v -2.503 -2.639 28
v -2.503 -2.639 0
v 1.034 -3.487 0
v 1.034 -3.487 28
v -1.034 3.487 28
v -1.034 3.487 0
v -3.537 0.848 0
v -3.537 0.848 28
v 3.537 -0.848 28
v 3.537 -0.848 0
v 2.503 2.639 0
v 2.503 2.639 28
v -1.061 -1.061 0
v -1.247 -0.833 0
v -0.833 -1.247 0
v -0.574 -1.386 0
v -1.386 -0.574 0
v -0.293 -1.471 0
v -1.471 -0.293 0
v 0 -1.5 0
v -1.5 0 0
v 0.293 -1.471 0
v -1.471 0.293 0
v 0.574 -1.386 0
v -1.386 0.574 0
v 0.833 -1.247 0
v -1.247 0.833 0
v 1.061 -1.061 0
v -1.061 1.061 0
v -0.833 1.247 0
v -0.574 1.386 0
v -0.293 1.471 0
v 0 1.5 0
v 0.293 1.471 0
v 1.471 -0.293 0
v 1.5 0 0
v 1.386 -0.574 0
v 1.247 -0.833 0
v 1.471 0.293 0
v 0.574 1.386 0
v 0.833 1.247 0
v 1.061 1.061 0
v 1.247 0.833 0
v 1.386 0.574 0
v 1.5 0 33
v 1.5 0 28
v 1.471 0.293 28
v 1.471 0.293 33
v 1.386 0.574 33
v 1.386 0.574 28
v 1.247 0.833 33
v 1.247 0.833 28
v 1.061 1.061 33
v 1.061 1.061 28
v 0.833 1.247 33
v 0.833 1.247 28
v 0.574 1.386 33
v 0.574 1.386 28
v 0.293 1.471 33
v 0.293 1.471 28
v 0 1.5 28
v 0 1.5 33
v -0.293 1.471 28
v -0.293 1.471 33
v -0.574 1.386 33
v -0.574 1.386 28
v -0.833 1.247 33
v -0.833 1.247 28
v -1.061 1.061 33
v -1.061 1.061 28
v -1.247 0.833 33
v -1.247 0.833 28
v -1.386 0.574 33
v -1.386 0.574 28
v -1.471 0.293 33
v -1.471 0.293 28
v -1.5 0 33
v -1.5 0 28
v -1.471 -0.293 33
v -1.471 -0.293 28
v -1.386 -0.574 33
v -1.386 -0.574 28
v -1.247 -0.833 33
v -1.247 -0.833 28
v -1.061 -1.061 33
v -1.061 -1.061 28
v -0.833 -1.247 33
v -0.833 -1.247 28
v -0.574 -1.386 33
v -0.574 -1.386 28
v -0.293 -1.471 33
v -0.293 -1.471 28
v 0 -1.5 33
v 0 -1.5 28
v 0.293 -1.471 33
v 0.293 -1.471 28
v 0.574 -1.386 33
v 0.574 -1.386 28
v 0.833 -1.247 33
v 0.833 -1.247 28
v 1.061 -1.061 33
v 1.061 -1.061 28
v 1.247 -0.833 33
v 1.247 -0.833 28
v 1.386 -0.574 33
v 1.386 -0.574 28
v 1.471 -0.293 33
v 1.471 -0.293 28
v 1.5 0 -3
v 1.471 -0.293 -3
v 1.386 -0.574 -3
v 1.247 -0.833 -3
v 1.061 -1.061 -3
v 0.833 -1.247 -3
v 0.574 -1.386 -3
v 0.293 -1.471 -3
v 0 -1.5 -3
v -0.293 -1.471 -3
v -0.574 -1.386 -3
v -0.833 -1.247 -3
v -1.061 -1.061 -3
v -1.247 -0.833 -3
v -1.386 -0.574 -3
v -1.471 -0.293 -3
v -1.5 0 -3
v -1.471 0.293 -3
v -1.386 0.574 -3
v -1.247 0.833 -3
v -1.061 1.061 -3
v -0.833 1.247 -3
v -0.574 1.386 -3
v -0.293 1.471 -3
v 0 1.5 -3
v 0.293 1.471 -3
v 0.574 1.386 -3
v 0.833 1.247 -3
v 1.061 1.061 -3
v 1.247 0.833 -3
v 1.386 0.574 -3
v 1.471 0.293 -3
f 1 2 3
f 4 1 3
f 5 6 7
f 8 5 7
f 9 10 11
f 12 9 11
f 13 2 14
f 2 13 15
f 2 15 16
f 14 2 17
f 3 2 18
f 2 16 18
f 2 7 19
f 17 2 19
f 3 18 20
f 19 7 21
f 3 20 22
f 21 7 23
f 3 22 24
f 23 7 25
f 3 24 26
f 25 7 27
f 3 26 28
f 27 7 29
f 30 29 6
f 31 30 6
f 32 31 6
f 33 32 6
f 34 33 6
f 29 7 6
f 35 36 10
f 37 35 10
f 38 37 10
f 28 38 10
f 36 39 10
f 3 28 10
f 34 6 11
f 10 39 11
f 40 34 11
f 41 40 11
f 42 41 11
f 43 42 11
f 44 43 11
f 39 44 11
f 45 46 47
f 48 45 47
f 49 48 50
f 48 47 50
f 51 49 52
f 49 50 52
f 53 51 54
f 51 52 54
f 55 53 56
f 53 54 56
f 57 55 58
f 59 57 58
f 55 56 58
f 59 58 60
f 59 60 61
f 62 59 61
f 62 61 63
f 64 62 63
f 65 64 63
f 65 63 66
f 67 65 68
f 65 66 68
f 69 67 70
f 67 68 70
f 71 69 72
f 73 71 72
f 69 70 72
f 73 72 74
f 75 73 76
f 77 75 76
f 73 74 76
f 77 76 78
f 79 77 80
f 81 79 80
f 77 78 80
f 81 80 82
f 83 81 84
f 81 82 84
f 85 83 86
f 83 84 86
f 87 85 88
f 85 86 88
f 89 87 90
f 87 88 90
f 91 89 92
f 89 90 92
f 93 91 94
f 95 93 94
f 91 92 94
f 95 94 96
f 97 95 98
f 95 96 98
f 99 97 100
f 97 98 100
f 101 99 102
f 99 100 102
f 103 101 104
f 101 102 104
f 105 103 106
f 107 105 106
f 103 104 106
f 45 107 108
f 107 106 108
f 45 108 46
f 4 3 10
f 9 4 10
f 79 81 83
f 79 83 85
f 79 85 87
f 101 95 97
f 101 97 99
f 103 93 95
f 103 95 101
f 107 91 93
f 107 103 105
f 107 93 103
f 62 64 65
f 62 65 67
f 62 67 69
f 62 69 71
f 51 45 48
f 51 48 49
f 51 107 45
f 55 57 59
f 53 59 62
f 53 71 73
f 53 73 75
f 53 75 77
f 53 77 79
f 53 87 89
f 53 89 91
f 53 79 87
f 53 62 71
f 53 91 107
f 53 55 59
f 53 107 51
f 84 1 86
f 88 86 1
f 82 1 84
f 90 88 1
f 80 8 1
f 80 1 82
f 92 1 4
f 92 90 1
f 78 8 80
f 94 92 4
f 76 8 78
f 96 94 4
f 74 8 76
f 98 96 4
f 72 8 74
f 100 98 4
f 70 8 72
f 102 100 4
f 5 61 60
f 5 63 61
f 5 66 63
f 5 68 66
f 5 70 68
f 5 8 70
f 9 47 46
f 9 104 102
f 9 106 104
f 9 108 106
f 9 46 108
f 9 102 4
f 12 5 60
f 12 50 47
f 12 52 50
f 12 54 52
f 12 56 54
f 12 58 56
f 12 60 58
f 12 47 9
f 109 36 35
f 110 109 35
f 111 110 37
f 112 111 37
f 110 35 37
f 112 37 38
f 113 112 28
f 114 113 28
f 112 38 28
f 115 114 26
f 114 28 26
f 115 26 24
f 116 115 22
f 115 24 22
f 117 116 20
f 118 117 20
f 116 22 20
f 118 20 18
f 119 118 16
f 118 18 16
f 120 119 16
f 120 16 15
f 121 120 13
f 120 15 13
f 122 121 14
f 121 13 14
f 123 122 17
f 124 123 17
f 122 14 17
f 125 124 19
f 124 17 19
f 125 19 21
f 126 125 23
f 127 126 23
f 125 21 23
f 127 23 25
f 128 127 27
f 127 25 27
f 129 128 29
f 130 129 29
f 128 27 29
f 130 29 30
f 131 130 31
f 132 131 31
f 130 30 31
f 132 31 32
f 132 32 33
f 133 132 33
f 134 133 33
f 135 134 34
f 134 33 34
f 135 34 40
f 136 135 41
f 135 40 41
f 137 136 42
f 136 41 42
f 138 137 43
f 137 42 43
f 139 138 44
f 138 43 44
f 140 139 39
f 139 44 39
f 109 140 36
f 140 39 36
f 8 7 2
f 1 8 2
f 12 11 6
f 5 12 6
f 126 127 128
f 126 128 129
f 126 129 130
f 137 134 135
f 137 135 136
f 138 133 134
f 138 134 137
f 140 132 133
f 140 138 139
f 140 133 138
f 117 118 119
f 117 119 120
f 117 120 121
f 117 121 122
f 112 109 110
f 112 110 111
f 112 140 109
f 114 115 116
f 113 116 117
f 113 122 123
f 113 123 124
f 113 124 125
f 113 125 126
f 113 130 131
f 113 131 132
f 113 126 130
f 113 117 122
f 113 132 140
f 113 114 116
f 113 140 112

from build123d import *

# Parameters (mm, degrees)
F1_DEPTH = 28
F2_R     = 1.5
F3_DEPTH = 5
F4_R     = 1.5
F5_DEPTH = 3


with BuildPart() as f1:
    # F0 (on Top) → F1 (new body)
    with BuildSketch(Plane.XY):
        Polygon((3.5371081789, -0.8478594996), (2.5028219549, 2.639295789), (-1.0342862239, 3.4871552886), (-3.5371081789, 0.8478594996), (-2.5028219549, -2.639295789), (1.0342862239, -3.4871552886), align=None)
    extrude(amount=F1_DEPTH)

    # F2 (on face) → F3 (join)
    with BuildSketch(Plane.XY.offset(28)):
        Circle(F2_R)
    extrude(amount=F3_DEPTH)

    # F4 (on face) → F5 (join)
    with BuildSketch(Plane(origin=(0, 0, 0), x_dir=(1, 0, 0), z_dir=(0, 0, -1))):
        Circle(F4_R)
    extrude(amount=F5_DEPTH)


solid = f1.part
